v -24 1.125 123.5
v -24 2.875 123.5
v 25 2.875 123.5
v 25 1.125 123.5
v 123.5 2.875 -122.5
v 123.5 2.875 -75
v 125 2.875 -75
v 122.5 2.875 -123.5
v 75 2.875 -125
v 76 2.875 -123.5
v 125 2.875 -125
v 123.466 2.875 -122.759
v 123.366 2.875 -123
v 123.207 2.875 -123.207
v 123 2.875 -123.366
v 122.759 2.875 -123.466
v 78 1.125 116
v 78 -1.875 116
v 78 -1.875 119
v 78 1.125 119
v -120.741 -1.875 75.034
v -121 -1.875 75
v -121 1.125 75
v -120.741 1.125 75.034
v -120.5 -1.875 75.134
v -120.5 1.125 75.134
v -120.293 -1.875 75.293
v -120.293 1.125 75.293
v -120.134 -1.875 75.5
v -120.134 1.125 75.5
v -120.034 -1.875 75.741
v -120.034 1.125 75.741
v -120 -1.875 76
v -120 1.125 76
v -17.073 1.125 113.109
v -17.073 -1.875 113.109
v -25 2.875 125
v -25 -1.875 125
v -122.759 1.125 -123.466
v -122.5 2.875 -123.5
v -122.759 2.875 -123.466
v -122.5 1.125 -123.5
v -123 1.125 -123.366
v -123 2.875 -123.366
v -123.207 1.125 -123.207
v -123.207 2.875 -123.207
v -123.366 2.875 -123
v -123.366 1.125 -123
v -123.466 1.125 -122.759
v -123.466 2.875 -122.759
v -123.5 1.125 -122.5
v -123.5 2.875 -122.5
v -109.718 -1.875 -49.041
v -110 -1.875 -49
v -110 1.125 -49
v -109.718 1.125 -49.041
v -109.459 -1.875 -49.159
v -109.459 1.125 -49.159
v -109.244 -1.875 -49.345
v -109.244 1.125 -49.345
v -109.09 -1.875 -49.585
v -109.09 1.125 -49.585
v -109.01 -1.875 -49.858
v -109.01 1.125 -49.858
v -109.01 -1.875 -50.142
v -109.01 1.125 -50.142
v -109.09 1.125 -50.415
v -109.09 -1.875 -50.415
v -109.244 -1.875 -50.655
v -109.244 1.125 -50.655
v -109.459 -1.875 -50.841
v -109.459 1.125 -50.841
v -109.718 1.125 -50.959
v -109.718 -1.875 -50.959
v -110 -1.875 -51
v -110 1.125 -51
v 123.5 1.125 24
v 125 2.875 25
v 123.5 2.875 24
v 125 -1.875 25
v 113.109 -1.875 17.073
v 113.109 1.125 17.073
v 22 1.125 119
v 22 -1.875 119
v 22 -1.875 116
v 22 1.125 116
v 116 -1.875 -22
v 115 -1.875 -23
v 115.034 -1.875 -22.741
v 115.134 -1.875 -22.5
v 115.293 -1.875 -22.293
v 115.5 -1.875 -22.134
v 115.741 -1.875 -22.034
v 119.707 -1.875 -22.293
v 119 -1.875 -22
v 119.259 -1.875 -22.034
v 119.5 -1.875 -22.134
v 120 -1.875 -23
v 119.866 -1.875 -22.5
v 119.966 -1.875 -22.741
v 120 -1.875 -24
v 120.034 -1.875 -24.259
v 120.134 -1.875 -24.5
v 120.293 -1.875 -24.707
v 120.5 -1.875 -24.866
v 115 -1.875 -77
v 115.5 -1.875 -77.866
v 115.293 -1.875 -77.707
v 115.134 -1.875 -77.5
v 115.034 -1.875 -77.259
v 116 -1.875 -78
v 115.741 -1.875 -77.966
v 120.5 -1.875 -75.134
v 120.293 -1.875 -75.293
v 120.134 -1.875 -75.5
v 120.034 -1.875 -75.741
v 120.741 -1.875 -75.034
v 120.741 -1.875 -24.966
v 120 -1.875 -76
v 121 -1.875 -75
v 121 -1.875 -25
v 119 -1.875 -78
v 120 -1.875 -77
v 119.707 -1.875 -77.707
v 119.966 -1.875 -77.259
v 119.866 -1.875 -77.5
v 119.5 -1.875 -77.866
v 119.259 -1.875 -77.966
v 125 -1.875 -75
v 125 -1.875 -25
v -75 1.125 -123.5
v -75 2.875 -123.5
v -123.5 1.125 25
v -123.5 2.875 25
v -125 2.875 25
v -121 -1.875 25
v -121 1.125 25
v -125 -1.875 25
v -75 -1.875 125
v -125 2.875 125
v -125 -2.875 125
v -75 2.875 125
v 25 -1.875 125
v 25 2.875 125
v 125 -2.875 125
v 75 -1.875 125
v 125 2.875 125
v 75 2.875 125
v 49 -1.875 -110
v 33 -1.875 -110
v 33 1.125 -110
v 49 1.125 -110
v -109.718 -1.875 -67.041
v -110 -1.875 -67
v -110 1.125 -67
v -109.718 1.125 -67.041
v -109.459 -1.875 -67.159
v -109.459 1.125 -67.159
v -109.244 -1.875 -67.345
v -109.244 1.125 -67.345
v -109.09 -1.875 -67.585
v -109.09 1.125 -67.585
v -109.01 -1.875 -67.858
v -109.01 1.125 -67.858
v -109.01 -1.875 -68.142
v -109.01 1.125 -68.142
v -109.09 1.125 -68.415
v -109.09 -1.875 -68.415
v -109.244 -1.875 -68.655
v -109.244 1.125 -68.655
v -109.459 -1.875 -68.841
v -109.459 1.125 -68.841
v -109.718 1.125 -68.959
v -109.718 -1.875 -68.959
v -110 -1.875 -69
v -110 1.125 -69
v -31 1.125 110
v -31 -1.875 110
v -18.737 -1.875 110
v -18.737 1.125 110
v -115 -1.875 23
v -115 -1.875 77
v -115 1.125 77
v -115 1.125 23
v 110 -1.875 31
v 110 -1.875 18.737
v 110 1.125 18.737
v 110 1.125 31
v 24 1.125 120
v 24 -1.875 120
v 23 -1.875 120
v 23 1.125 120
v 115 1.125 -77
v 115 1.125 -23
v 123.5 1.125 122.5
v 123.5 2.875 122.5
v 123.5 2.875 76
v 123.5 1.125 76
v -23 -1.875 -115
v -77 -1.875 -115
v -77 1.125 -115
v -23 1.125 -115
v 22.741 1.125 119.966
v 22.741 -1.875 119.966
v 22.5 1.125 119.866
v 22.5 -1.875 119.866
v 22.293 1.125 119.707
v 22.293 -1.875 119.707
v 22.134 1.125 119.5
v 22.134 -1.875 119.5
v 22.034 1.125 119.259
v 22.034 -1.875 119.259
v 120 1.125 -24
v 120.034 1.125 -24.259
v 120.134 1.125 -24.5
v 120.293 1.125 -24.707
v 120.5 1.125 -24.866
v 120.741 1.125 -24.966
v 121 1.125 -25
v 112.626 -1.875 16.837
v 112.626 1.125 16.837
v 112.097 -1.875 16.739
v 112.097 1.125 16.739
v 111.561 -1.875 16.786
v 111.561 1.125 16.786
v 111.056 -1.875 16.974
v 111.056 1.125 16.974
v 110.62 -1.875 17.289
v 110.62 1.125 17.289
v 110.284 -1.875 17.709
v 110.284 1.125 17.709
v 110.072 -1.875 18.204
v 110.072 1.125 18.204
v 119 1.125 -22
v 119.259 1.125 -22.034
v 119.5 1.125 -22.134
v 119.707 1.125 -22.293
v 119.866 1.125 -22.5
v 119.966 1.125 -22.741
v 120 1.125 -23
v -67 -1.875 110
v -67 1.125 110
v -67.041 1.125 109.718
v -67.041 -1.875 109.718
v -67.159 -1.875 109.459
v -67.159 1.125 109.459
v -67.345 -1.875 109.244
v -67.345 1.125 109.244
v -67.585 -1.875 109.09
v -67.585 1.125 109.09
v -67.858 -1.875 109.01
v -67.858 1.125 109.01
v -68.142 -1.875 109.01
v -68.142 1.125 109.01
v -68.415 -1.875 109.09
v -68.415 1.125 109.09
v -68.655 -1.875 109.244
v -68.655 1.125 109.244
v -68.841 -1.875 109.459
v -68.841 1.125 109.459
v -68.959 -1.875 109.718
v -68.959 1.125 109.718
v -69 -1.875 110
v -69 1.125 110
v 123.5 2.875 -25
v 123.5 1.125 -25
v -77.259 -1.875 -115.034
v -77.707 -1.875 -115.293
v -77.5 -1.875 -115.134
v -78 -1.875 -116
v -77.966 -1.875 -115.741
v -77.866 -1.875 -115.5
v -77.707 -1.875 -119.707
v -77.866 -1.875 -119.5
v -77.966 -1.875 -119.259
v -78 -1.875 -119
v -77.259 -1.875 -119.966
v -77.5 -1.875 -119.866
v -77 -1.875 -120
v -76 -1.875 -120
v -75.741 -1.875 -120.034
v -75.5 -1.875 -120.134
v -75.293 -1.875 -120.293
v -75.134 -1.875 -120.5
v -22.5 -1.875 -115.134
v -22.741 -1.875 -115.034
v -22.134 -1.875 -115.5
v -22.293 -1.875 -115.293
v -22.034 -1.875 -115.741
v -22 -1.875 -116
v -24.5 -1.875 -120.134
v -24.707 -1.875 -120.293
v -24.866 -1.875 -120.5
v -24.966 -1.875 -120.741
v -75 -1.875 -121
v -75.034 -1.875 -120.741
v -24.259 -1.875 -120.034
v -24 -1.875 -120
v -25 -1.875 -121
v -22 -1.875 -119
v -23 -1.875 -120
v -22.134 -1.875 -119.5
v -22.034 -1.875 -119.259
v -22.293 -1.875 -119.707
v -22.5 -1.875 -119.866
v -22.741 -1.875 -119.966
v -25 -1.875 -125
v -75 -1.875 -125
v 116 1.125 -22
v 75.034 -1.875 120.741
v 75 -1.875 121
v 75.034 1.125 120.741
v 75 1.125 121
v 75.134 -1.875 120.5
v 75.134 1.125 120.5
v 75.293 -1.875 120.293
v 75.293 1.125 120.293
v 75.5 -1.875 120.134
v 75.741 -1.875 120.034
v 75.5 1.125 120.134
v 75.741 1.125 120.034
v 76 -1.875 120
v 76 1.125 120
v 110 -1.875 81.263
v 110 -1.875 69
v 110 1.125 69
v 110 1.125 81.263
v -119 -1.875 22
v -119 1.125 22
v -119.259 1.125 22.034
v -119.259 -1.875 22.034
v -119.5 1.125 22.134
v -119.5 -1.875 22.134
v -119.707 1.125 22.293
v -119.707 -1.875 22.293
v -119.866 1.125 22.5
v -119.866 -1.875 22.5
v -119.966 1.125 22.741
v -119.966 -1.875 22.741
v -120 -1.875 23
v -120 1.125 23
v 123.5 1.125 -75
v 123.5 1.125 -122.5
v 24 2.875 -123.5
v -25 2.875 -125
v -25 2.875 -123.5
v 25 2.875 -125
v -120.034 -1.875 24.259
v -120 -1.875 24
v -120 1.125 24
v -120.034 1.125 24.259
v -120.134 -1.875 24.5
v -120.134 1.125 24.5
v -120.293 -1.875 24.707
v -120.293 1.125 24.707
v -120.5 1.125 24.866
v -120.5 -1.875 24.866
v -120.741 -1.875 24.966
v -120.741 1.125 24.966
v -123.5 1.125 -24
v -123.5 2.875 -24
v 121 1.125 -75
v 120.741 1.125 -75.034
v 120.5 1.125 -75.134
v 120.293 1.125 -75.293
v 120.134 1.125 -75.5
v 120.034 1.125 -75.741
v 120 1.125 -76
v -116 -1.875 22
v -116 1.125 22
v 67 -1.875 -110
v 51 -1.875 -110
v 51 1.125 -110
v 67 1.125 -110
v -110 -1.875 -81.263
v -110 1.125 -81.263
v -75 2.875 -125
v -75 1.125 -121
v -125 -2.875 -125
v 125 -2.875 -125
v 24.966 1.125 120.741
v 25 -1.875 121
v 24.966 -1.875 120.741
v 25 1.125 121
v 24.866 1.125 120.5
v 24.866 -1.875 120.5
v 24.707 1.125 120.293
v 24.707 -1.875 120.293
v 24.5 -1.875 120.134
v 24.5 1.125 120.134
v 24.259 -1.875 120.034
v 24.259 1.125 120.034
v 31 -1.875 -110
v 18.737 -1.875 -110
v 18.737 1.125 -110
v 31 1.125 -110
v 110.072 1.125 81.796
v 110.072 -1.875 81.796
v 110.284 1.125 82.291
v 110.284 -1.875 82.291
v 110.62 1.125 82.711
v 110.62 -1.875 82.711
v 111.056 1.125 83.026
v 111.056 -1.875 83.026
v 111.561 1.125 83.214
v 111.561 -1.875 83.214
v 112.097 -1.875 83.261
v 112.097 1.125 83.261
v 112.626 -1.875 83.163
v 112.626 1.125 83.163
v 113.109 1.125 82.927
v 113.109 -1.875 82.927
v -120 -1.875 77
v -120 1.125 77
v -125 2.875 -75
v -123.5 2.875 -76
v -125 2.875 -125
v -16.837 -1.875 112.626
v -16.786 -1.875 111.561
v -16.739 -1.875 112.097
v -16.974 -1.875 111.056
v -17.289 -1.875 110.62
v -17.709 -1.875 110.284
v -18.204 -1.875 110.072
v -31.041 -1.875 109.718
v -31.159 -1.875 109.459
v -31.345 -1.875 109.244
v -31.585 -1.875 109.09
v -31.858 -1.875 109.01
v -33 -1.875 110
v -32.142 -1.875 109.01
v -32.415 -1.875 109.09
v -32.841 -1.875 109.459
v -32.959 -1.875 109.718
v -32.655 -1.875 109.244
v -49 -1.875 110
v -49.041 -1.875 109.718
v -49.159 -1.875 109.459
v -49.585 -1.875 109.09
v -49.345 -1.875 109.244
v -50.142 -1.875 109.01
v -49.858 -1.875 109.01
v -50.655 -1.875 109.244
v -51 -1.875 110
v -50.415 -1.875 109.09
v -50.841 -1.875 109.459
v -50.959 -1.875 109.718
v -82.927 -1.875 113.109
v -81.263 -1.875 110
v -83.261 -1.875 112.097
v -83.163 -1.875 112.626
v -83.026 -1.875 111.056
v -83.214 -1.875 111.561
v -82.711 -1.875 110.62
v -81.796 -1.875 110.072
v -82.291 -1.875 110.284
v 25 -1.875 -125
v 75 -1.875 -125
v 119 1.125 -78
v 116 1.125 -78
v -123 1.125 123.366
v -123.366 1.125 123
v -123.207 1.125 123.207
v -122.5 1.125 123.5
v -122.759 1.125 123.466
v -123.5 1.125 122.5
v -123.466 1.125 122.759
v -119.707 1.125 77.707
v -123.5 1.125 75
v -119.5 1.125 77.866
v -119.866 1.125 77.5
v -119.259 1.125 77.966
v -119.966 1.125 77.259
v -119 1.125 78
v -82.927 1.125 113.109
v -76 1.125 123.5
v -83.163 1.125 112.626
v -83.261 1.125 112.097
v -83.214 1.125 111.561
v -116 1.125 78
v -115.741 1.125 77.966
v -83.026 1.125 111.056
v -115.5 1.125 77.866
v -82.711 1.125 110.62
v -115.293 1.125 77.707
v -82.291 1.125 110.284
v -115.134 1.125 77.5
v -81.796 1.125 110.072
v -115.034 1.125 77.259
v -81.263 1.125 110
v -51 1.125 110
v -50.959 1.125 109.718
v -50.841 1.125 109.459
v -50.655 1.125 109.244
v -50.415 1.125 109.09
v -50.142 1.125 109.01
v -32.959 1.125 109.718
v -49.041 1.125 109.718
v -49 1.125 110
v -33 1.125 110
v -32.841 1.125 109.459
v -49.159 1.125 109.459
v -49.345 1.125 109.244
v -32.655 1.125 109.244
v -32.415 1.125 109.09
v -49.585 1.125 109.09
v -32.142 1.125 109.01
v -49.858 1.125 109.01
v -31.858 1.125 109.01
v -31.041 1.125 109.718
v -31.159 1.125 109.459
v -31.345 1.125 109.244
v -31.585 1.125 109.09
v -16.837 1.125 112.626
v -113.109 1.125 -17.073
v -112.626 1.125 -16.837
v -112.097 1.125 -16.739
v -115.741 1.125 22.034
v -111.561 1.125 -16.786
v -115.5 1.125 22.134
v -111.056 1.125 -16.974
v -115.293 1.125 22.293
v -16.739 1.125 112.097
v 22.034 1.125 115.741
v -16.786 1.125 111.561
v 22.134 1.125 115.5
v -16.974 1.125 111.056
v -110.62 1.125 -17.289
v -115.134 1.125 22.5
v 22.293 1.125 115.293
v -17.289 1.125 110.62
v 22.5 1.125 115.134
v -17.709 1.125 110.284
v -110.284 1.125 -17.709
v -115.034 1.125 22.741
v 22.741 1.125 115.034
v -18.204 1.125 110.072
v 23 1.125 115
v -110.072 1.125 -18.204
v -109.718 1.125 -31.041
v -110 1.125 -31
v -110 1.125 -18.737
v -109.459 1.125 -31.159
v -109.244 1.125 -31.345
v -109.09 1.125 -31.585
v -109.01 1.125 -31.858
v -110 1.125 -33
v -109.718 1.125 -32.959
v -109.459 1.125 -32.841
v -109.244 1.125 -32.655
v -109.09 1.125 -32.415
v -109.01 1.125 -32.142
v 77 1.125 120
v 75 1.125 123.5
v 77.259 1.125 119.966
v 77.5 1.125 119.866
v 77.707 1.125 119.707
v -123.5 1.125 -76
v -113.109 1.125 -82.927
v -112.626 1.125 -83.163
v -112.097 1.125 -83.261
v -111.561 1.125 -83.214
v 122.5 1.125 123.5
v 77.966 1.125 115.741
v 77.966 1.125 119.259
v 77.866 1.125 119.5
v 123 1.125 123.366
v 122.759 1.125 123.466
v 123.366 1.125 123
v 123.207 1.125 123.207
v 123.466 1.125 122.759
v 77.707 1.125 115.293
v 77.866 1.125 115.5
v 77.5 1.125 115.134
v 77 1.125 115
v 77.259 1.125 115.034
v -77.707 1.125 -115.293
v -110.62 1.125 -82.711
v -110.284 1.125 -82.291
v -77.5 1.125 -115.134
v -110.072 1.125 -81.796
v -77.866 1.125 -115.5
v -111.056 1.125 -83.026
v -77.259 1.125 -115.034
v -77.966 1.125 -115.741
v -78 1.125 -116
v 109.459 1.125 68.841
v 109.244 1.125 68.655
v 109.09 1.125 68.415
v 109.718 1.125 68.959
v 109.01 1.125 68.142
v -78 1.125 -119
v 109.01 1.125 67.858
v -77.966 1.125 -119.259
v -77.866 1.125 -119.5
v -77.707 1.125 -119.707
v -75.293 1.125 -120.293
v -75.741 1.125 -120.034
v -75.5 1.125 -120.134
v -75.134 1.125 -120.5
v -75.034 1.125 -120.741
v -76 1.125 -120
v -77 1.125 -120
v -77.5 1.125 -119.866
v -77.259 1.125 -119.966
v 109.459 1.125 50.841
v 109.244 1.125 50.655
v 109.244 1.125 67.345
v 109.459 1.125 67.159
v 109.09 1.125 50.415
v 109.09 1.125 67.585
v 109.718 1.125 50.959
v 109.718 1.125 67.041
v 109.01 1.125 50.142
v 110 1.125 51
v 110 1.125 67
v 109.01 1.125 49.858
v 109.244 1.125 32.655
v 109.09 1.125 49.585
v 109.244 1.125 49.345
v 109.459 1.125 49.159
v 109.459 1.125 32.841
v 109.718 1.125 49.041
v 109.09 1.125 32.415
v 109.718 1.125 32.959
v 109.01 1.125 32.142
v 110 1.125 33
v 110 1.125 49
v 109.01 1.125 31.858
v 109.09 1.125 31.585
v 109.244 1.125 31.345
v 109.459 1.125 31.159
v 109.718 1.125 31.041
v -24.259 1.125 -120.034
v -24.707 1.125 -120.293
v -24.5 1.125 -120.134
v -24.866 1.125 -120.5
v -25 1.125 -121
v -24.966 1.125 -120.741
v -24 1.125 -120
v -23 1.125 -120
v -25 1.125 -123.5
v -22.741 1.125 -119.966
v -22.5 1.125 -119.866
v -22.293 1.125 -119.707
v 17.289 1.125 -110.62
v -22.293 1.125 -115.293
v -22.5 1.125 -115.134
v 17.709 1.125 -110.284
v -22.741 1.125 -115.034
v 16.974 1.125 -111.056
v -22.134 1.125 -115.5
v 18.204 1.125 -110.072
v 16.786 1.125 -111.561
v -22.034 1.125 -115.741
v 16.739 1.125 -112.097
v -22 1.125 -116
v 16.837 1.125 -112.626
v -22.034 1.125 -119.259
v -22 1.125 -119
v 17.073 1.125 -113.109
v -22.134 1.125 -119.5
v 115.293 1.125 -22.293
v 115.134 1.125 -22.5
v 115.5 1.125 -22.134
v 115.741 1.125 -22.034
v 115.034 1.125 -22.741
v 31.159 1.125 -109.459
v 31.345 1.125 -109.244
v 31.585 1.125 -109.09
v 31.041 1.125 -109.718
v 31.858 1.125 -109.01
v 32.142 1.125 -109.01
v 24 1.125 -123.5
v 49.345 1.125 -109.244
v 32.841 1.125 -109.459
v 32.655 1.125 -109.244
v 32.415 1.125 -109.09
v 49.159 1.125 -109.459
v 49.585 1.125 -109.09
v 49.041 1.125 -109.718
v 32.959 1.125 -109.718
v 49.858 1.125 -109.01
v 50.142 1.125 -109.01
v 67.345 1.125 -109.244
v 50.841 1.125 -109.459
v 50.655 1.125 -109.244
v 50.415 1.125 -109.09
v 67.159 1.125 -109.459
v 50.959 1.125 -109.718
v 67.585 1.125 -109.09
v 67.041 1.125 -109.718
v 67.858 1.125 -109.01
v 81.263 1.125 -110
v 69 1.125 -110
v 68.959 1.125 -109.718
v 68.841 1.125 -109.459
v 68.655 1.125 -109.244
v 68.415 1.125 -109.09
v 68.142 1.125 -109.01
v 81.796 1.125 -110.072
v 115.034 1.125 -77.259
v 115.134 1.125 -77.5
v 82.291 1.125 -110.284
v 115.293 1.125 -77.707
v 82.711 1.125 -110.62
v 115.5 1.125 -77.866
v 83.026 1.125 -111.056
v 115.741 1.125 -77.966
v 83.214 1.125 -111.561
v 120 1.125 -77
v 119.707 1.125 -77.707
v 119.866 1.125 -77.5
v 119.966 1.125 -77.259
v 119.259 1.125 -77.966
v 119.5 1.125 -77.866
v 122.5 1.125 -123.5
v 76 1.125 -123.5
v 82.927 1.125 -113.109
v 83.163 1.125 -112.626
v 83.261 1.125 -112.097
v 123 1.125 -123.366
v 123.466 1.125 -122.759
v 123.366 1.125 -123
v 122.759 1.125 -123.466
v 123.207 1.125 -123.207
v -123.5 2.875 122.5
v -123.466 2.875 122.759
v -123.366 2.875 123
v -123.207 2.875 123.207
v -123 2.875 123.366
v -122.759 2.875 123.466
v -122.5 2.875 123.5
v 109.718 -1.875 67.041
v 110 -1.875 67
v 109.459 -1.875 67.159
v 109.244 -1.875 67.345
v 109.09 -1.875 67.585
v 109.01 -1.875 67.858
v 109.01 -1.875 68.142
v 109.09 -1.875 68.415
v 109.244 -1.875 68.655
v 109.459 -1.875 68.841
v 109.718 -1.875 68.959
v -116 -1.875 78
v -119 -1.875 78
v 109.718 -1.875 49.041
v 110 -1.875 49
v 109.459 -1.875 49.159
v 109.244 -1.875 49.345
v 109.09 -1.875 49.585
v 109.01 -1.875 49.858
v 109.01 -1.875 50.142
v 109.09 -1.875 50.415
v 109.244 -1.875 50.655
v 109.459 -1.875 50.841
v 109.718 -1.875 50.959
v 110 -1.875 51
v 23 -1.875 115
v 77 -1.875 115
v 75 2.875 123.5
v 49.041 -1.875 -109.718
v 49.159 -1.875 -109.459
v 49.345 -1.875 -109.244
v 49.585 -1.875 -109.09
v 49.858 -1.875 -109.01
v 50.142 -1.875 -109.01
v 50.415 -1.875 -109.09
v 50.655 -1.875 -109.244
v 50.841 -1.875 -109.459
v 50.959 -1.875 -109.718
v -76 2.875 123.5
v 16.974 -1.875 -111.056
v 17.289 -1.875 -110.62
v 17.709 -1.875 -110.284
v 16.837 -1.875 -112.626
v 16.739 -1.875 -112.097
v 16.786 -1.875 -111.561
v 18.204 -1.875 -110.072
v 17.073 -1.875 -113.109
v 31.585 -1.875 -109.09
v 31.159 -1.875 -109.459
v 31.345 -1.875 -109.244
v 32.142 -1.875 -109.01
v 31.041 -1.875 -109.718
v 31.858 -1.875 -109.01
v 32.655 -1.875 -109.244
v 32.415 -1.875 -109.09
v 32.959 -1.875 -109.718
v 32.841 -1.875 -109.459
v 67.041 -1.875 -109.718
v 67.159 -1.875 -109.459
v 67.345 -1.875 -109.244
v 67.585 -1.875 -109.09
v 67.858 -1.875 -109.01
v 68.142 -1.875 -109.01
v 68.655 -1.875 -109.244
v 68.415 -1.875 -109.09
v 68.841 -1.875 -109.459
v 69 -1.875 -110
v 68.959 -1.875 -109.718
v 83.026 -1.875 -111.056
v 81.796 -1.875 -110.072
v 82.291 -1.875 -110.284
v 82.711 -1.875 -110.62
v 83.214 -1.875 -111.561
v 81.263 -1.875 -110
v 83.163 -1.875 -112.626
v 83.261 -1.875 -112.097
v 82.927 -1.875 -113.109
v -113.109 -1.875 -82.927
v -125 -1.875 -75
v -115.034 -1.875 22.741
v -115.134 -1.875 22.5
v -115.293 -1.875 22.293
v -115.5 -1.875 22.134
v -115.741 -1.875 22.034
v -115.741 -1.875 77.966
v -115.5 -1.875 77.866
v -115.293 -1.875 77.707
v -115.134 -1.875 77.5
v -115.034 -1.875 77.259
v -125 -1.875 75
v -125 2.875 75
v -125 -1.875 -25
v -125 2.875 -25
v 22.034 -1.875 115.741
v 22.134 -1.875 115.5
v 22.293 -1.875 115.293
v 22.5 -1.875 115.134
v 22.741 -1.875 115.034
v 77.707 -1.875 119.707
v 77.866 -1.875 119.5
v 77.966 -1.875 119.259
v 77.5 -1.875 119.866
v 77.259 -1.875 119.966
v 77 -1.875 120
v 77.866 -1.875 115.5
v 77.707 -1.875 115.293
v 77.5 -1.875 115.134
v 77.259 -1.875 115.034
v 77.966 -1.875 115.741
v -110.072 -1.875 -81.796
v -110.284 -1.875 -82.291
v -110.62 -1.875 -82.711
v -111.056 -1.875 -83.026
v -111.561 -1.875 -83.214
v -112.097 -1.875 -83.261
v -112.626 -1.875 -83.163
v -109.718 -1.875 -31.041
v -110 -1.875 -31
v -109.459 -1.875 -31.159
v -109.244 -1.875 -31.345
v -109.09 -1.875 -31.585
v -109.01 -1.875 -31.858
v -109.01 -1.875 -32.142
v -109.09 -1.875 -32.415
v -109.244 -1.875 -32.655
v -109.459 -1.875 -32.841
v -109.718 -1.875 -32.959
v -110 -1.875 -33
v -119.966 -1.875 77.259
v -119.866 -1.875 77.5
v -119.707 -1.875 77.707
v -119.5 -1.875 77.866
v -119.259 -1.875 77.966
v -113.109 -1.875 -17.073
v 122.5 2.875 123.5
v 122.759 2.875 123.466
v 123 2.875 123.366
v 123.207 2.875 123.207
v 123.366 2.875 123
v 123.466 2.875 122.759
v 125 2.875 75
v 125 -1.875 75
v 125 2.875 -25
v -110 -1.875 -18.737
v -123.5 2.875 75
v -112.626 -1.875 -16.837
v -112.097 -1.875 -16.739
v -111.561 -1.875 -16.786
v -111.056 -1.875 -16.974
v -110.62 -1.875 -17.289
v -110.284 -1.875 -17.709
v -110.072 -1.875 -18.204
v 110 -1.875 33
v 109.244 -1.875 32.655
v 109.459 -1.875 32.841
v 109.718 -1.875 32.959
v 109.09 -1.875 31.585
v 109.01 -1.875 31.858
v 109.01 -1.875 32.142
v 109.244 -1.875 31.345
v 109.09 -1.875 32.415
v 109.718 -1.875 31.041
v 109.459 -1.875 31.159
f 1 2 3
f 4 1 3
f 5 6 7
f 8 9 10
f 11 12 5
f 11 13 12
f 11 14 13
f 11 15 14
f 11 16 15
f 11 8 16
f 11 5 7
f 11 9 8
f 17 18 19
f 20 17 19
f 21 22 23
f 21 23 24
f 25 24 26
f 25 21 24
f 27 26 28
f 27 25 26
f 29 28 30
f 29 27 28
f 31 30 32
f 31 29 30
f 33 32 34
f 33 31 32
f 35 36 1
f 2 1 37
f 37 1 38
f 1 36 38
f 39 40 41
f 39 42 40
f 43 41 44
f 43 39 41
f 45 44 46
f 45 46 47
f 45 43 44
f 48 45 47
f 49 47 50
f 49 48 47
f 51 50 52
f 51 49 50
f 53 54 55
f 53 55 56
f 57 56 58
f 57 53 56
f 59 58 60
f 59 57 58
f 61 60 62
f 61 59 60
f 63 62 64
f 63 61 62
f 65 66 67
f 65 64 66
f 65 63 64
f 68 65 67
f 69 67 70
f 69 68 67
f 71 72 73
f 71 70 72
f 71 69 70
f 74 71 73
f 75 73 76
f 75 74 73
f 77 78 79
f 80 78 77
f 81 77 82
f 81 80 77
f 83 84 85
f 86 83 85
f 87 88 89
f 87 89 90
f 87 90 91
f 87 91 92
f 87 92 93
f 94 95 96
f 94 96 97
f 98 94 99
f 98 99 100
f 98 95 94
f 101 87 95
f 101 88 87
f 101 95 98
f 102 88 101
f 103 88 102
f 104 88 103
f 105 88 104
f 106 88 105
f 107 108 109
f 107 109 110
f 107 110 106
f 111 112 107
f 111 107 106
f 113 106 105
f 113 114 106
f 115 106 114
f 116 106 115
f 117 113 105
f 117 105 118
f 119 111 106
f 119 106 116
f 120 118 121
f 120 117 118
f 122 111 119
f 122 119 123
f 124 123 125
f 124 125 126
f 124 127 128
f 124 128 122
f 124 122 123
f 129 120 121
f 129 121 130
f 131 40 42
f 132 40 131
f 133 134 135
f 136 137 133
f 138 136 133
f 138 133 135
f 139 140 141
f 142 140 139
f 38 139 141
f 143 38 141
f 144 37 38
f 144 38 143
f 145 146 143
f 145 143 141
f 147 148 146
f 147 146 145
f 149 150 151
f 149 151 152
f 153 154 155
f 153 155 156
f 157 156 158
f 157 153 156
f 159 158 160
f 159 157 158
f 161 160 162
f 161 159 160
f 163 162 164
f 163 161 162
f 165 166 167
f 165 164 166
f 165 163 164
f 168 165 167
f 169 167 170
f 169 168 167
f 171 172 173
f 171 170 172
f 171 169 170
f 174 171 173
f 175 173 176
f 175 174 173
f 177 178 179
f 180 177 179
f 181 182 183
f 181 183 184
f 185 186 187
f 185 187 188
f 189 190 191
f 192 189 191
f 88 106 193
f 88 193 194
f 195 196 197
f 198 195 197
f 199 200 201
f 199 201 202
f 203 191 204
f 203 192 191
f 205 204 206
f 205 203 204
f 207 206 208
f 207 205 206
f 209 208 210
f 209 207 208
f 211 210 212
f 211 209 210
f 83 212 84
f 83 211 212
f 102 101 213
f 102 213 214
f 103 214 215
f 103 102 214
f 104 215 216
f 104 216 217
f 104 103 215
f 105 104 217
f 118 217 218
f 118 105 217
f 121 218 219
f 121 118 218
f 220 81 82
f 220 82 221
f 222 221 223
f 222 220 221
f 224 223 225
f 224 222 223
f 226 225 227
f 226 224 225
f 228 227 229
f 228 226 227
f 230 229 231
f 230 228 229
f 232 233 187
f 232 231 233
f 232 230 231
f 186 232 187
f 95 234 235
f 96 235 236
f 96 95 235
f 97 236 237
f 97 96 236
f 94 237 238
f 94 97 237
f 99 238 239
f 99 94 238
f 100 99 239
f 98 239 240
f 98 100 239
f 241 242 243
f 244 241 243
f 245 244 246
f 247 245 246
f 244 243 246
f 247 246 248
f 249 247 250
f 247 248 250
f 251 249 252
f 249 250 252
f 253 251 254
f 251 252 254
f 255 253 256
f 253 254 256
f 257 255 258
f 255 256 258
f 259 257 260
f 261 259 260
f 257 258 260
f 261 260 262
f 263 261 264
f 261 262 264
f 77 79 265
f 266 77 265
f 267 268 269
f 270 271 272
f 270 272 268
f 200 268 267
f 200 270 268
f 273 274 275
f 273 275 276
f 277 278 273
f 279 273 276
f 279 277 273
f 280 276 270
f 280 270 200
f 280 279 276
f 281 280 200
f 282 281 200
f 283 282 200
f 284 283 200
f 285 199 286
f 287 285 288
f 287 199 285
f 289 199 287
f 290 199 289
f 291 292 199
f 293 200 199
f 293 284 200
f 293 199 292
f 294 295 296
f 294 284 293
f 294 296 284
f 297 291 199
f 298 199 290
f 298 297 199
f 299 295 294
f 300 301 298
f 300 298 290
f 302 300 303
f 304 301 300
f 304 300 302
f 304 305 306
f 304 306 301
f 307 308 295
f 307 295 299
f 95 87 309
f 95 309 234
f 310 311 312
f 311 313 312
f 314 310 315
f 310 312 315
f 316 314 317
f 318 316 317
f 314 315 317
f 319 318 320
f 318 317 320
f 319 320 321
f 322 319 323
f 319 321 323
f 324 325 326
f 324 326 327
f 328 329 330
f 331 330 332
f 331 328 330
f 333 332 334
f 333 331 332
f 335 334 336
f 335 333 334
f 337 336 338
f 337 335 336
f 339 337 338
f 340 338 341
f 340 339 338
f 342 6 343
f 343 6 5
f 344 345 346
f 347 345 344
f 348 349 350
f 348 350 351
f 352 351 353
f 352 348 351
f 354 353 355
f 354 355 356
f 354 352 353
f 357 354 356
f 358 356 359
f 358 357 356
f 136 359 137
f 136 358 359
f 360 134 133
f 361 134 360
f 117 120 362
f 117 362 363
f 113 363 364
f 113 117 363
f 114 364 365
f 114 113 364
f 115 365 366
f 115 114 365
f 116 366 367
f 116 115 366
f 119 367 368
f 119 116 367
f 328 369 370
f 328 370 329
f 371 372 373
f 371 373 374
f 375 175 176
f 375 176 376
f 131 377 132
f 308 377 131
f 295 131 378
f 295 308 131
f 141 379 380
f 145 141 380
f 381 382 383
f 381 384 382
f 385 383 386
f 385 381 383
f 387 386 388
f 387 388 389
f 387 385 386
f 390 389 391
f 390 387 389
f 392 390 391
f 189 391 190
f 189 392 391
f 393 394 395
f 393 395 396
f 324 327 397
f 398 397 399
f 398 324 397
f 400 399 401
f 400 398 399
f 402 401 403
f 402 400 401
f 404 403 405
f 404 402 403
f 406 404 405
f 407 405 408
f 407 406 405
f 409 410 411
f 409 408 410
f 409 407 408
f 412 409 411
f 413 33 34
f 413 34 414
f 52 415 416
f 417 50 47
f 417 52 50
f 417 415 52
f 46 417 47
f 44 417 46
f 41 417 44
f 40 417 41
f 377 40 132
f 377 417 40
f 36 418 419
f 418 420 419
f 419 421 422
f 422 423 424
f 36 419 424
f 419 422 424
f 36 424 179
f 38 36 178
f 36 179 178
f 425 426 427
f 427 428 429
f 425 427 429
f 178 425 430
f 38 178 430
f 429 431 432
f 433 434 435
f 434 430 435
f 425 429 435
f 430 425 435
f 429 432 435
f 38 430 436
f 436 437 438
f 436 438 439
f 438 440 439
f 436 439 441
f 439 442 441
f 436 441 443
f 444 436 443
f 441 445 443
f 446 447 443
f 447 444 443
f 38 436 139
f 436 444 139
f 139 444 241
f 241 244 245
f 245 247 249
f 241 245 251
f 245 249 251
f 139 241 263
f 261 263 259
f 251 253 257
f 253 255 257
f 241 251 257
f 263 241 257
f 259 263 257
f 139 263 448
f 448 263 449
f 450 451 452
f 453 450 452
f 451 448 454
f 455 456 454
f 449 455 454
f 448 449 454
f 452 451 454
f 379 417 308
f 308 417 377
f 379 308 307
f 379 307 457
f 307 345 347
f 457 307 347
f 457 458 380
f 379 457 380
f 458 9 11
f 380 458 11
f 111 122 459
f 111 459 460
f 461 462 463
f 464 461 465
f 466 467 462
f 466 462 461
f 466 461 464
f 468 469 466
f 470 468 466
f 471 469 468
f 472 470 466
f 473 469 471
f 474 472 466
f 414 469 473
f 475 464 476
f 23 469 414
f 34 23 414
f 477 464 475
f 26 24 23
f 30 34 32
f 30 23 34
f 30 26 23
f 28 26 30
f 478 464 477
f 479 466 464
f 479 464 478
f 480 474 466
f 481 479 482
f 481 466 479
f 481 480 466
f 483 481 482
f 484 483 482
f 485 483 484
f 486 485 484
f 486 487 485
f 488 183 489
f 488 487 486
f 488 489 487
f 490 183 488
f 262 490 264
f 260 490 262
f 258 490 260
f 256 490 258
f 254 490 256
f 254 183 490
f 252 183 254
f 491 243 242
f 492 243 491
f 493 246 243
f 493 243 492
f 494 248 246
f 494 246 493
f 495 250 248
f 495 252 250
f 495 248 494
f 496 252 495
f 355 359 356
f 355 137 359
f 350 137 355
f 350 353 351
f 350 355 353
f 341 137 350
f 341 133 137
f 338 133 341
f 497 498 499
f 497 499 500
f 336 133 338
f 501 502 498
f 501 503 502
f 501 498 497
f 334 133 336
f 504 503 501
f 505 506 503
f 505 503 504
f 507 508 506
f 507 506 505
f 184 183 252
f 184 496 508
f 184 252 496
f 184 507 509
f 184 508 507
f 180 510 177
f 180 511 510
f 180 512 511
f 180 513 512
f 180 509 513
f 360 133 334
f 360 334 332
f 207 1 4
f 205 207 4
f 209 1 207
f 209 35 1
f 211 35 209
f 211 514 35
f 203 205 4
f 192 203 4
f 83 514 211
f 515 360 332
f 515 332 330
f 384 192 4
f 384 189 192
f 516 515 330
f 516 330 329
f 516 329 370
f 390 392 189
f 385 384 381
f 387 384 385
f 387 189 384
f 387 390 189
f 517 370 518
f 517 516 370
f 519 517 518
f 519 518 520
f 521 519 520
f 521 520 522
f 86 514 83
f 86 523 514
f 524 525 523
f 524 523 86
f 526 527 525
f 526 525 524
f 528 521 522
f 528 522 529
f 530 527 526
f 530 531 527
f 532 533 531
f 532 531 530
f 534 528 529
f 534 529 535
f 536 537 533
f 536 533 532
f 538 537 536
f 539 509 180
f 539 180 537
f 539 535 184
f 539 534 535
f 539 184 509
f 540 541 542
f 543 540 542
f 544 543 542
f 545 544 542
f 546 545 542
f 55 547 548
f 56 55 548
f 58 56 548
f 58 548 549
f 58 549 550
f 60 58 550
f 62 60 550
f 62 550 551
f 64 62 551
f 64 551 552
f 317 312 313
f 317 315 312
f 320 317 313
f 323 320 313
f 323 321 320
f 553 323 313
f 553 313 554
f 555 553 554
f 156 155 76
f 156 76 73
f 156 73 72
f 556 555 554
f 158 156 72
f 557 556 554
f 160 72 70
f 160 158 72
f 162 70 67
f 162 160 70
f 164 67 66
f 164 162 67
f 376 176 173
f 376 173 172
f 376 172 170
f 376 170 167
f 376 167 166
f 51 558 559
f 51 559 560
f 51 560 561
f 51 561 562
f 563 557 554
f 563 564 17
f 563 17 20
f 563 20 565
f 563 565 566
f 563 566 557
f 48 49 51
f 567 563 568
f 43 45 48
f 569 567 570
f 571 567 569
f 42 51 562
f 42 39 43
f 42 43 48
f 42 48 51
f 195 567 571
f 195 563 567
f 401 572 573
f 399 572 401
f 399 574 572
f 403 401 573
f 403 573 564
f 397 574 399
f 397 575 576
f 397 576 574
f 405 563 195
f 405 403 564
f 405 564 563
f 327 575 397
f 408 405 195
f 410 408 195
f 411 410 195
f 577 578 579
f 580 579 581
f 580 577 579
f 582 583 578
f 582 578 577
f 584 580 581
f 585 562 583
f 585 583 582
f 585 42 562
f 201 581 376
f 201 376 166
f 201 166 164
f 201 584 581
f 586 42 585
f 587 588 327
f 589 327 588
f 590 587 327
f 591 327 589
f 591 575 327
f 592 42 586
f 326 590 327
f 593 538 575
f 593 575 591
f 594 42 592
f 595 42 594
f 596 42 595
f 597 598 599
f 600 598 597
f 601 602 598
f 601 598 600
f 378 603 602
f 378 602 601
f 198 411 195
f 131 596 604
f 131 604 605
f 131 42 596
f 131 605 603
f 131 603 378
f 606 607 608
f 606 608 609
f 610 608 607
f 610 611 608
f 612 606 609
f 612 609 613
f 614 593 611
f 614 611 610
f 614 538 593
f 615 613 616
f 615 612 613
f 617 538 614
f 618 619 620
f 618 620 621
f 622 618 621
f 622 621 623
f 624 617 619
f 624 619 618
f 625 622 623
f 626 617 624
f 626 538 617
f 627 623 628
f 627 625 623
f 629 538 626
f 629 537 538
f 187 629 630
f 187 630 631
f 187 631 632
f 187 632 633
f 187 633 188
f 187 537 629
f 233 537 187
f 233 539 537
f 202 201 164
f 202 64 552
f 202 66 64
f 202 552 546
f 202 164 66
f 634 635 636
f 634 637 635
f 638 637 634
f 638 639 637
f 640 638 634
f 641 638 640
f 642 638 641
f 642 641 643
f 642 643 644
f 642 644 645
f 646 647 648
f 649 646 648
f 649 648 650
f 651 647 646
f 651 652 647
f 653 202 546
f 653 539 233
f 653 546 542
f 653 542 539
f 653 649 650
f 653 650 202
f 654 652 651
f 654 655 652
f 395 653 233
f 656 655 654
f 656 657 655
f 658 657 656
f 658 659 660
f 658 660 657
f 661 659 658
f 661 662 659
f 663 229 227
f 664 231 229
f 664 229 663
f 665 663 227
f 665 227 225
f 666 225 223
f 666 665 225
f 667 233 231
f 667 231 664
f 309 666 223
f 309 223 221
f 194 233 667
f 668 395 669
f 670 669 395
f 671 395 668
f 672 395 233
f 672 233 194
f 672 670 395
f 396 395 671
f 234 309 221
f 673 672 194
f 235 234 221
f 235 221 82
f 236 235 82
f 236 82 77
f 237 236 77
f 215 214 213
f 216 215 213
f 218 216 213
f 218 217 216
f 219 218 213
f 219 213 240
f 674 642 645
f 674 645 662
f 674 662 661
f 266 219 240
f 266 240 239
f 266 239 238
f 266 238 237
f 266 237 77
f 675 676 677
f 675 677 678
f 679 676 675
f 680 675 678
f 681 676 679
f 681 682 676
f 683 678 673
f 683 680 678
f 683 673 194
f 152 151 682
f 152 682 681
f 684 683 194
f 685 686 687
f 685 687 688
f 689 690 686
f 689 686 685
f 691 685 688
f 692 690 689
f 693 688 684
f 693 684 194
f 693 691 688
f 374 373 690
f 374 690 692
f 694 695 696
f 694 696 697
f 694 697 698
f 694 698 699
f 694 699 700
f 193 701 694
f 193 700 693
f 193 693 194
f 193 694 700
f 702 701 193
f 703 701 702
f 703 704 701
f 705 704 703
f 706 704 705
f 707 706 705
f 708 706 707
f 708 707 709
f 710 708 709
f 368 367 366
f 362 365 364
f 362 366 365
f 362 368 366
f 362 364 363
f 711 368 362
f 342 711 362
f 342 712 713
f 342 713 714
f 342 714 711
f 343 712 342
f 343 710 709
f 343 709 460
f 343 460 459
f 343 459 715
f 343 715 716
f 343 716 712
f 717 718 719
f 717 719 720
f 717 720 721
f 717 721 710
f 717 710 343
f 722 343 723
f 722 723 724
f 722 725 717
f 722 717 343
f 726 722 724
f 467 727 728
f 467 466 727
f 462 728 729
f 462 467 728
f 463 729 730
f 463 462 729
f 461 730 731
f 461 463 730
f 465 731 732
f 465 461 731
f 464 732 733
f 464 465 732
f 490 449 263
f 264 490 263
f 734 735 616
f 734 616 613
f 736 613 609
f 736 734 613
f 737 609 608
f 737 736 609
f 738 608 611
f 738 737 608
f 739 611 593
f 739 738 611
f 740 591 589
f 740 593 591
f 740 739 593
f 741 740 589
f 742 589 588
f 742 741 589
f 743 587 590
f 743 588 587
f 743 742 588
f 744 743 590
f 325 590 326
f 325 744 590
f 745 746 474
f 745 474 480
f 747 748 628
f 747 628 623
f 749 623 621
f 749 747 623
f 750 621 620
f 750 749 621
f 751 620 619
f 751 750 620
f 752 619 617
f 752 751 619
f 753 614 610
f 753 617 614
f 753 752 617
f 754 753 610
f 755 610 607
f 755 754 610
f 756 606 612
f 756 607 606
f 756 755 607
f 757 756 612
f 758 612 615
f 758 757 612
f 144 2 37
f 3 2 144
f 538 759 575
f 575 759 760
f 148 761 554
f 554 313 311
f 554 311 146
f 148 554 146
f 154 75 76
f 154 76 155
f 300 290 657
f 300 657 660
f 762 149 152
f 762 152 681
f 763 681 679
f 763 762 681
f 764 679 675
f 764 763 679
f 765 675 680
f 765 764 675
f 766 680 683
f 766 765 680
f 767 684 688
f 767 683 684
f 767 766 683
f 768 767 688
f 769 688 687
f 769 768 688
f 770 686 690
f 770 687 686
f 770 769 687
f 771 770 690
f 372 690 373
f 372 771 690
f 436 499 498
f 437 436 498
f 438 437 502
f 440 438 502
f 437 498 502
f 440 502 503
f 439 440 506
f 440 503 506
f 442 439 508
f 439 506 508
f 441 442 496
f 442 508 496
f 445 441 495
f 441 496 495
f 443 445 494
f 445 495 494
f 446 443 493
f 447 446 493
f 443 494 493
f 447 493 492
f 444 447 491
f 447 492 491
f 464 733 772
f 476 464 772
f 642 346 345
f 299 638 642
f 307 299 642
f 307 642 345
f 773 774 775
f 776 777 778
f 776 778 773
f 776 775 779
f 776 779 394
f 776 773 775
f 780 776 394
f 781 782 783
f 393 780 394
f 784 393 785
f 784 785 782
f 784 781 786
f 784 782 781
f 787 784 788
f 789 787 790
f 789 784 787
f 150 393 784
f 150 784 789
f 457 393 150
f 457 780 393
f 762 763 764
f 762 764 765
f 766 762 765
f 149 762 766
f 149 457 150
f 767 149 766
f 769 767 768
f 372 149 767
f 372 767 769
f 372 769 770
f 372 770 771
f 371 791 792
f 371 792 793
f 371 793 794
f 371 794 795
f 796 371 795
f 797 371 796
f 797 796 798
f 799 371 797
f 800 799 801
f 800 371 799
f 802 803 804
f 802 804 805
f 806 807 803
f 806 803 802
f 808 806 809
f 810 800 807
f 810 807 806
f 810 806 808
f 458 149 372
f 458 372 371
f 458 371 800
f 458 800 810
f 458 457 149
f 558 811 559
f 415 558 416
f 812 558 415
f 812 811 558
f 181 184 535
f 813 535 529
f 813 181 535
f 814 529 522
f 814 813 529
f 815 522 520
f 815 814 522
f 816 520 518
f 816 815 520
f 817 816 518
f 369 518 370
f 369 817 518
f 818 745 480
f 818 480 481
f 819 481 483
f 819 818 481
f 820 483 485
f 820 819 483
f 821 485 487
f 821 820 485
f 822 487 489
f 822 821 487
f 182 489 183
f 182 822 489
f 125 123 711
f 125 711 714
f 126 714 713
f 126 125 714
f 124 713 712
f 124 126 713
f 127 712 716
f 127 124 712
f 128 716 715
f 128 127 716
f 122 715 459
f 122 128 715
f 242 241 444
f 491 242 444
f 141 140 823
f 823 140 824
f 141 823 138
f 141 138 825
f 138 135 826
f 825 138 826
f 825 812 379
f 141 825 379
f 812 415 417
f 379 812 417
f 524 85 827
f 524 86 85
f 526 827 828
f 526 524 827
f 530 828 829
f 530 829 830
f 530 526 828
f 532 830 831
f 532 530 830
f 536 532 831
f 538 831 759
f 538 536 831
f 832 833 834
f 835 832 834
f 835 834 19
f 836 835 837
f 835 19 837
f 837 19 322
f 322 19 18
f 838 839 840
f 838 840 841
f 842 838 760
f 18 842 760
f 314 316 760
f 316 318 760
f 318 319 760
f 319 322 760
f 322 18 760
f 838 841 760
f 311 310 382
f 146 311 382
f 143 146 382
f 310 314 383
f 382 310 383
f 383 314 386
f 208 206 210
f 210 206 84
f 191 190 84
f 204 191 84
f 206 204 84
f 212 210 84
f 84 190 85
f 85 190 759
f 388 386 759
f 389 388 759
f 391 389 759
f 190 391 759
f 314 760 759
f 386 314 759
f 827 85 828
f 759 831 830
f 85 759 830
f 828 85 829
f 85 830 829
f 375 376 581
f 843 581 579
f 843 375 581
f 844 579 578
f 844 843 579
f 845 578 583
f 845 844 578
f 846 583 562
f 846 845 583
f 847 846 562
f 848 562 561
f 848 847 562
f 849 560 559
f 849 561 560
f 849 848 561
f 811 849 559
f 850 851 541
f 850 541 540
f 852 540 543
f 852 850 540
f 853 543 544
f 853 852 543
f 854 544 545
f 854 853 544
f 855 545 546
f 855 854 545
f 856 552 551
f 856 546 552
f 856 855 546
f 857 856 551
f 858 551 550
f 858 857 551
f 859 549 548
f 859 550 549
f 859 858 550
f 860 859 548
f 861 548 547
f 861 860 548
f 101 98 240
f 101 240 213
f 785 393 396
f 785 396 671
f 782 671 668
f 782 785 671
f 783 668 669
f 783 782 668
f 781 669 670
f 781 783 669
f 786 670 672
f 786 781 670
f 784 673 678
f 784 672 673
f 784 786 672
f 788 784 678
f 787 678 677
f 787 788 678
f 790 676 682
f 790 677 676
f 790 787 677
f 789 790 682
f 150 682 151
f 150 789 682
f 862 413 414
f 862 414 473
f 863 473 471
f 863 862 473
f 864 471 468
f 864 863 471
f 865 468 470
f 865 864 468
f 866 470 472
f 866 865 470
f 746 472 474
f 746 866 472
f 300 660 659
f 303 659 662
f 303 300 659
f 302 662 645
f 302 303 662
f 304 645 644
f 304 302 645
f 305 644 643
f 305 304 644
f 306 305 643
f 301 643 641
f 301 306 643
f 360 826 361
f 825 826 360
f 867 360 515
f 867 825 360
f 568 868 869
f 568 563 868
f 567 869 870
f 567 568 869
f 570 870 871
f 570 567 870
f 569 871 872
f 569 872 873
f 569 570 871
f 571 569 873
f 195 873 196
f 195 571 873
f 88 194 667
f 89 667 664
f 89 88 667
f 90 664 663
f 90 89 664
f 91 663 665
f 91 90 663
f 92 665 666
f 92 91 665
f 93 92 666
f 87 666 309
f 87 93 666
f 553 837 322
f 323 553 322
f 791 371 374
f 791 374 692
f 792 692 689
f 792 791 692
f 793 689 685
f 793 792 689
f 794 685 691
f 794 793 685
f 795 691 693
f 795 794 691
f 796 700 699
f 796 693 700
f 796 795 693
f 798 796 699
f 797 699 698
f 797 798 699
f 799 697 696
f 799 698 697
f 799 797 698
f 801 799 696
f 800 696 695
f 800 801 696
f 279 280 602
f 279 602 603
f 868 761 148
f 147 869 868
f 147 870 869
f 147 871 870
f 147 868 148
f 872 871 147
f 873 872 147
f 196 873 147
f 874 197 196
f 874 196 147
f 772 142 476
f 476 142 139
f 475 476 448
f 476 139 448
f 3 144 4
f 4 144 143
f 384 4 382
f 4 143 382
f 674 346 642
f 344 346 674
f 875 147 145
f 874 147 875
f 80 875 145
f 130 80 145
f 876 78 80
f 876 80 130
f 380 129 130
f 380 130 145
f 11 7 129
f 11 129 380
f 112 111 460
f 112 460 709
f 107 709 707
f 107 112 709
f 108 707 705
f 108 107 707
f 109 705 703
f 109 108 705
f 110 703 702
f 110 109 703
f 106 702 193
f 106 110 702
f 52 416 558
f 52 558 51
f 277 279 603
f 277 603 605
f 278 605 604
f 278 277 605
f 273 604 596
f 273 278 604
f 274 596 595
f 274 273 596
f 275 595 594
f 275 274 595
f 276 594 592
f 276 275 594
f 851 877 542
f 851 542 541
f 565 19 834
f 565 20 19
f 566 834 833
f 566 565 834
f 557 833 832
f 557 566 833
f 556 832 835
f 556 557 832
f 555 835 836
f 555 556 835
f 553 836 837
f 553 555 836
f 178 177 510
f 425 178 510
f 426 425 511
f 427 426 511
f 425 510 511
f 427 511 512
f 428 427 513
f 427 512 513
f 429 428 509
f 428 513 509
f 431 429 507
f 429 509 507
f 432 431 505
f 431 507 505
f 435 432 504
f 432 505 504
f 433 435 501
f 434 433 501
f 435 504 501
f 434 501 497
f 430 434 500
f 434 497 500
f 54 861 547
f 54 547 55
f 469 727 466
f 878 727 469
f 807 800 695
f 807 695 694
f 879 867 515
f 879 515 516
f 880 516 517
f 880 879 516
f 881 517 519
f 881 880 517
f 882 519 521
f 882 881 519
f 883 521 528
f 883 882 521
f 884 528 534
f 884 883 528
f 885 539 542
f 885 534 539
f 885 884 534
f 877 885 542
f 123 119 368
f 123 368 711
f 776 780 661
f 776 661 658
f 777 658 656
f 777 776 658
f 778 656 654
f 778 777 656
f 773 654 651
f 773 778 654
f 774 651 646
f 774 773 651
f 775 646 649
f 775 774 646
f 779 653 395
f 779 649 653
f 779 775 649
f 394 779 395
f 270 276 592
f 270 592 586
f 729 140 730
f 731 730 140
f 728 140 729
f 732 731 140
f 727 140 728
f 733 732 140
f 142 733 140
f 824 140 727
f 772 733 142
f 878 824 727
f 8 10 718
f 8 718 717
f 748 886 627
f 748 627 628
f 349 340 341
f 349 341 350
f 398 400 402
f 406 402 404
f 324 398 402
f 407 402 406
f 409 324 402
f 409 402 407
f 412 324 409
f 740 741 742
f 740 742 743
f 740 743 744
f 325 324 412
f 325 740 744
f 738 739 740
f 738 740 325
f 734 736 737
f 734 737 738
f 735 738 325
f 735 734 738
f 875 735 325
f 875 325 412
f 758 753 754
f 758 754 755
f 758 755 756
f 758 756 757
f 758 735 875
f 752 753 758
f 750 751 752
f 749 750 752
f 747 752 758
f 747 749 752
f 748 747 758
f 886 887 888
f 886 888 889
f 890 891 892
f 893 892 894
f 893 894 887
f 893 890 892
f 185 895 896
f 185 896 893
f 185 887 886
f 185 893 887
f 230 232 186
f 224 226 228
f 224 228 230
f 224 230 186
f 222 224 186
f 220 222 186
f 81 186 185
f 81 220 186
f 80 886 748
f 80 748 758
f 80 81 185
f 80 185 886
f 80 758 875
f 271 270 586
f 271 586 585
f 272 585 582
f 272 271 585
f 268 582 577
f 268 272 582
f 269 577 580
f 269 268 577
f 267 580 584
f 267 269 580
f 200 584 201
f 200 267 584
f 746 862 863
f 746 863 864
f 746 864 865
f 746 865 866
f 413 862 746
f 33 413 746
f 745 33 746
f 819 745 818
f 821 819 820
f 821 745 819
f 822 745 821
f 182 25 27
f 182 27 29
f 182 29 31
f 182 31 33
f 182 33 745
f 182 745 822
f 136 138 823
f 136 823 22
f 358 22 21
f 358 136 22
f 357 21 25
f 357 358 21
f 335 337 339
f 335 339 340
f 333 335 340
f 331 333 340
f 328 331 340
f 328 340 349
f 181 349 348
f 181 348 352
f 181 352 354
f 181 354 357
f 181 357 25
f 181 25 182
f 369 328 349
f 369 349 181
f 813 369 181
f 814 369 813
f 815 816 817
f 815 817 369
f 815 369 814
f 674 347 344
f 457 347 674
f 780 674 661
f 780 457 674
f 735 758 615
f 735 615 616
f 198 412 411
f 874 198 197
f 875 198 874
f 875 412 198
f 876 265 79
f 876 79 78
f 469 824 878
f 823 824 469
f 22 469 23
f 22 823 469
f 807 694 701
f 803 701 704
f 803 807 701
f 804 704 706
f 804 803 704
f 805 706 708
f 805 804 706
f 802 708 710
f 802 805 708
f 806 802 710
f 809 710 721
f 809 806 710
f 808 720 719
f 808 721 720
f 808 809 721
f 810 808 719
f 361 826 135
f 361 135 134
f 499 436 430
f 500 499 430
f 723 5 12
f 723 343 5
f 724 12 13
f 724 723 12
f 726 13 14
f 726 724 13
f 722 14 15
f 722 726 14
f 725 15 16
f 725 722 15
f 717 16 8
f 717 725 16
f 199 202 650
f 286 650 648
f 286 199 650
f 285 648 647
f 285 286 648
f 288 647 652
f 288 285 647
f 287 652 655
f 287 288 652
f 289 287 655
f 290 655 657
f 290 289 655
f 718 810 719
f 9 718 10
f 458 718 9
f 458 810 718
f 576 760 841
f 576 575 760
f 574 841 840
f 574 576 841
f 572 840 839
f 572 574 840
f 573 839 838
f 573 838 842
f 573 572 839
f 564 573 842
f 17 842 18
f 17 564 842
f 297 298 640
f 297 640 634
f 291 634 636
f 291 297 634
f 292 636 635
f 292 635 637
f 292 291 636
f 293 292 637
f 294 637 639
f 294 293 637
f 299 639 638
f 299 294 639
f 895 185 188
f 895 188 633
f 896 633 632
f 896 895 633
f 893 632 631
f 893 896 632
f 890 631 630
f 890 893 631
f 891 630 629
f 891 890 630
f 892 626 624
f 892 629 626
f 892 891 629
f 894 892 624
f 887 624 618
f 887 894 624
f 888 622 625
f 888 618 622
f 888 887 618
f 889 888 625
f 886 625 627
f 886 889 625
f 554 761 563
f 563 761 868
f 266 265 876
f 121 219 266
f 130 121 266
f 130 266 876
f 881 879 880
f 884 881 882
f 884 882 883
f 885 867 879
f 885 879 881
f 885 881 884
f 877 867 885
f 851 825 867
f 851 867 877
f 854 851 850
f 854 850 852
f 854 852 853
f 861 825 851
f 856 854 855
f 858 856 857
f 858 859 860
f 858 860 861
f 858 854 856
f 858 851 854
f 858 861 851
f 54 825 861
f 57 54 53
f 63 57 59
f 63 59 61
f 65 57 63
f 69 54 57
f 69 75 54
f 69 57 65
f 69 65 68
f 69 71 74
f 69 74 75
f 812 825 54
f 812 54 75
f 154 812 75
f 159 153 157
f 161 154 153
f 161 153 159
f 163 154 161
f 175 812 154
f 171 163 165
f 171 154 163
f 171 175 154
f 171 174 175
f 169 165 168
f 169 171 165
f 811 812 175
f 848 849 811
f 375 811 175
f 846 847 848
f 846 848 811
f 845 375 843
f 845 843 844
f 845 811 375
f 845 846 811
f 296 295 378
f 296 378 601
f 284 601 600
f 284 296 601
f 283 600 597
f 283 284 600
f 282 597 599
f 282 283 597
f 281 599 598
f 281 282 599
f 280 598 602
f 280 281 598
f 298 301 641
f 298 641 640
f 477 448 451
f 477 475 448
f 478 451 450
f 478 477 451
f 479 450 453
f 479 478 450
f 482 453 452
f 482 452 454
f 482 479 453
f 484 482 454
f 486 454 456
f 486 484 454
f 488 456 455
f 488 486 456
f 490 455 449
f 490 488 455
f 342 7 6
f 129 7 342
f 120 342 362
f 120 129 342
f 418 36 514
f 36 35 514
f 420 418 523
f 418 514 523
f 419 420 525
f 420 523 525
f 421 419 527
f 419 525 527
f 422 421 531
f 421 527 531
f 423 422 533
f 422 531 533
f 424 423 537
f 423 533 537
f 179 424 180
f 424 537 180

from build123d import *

# Parameters (mm, degrees)
SKETCH1_W           = 250
SKETCH1_H           = 250
BOSS_EXTRUDE1_DEPTH = 2.875
SKETCH2_W           = 247
SKETCH2_H           = 247
CUT_EXTRUDE1_DEPTH  = 1.75
CUT_EXTRUDE2_START  = -4.75
CUT_EXTRUDE2_DEPTH  = 182.620185447
CUT_EXTRUDE4_DEPTH  = 3
CUT_EXTRUDE3_START  = -4.75
CUT_EXTRUDE3_DEPTH  = 182.620185447
FILLET2_R           = 1
FILLET3_R           = 2
CIRPATTERN1_START   = -1.875
CIRPATTERN1_DEPTH   = 4.75


# Read off the part's stored shape, not the designer's step: CirPattern1
with BuildPart() as part:
    # Sketch1 → Boss-Extrude1 (new, symmetric)
    with BuildSketch(Plane(origin=(0, 0, 0), x_dir=(1, 0, 0), z_dir=(0, 1, 0))):
        Rectangle(SKETCH1_W, SKETCH1_H)
    extrude(amount=BOSS_EXTRUDE1_DEPTH, both=True)

    # Sketch2 → Cut-Extrude1 (cut)
    with BuildSketch(Plane(origin=(0, 2.875, 0), x_dir=(1, 0, 0), z_dir=(0, 1, 0))):
        Rectangle(SKETCH2_W, SKETCH2_H)
    extrude(amount=-CUT_EXTRUDE1_DEPTH, mode=Mode.SUBTRACT)

    # Sketch4 → Cut-Extrude2 (cut)
    with BuildSketch(Plane(origin=(0, 2.875, 0), x_dir=(1, 0, 0), z_dir=(0, 1, 0)).offset(CUT_EXTRUDE2_START)):
        Polygon((-75, -125), (-85, -110), (-15, -110), (-25, -125), align=None)
    extrude(amount=CUT_EXTRUDE2_DEPTH, mode=Mode.SUBTRACT)

    # Sketch6 → Cut-Extrude4 (cut)
    with BuildSketch(Plane(origin=(0, 1.125, 0), x_dir=(1, 0, 0), z_dir=(0, 1, 0))):
        with BuildLine():
            Line((-69, -110), (-67, -110))
            ThreePointArc((-67, -110), (-68, -109), (-69, -110))
        make_face()
        with BuildLine():
            Line((-51, -110), (-49, -110))
            ThreePointArc((-49, -110), (-50, -109), (-51, -110))
        make_face()
        with BuildLine():
            Line((-33, -110), (-31, -110))
            ThreePointArc((-31, -110), (-32, -109), (-33, -110))
        make_face()
    extrude(amount=-CUT_EXTRUDE4_DEPTH, mode=Mode.SUBTRACT)

    # Sketch5 → Cut-Extrude3 (cut)
    with BuildSketch(Plane(origin=(0, 2.875, 0), x_dir=(1, 0, 0), z_dir=(0, 1, 0)).offset(CUT_EXTRUDE3_START)):
        Polygon((25, -125), (25, -120), (22, -120), (22, -115), (78, -115), (78, -120), (75, -120), (75, -125), align=None)
    extrude(amount=CUT_EXTRUDE3_DEPTH, mode=Mode.SUBTRACT)

    # Fillet2
    fillet2_edges = [part.edges().sort_by_distance(p)[0] for p in [
        (-123.5, 2, -123.5),
        (-123.5, 2, 123.5),
        (123.5, 2, 123.5),
        (123.5, 2, -123.5),
        (75, -0.375, 120),
        (78, -0.375, 120),
        (78, -0.375, 115),
        (22, -0.375, 115),
        (22, -0.375, 120),
        (25, -0.375, 120),
    ]]
    fillet(fillet2_edges, radius=FILLET2_R)

    # Fillet3
    fillet3_edges = [part.edges().sort_by_distance(p)[0] for p in [
        (-85, -0.375, 110),
        (-15, -0.375, 110),
    ]]
    fillet(fillet3_edges, radius=FILLET3_R)

    # CirPattern1 outline → CirPattern1 (cut)
    with BuildSketch(Plane(origin=(0, 0, 0), x_dir=(1, 0, 0), z_dir=(0, 1, 0)).offset(CIRPATTERN1_START)):
        with BuildLine():
            ThreePointArc((110, -31), (109, -32), (110, -33))
            Line((110, -33), (110, -49))
            ThreePointArc((110, -49), (109, -50), (110, -51))
            Line((110, -51), (110, -67))
            ThreePointArc((110, -67), (109, -68), (110, -69))
            Line((110, -69), (110, -81.262965816))
            ThreePointArc((110, -81.262965816), (111.056284149, -83.026315014), (113.109400392, -82.927066405))
            Line((113.109400392, -82.927066405), (125, -75))
            Line((125, -75), (125, -25))
            Line((125, -25), (113.109400392, -17.072933595))
            ThreePointArc((113.109400392, -17.072933595), (111.056284149, -16.973684986), (110, -18.737034184))
            Line((110, -18.737034184), (110, -31))
        make_face()
        with BuildLine():
            Line((-125, 75), (-125, 25))
            Line((-125, 25), (-113.109400392, 17.072933595))
            ThreePointArc((-113.109400392, 17.072933595), (-111.056284149, 16.973684986), (-110, 18.737034184))
            Line((-110, 18.737034184), (-110, 31))
            ThreePointArc((-110, 31), (-109, 32), (-110, 33))
            Line((-110, 33), (-110, 49))
            ThreePointArc((-110, 49), (-109, 50), (-110, 51))
            Line((-110, 51), (-110, 67))
            ThreePointArc((-110, 67), (-109, 68), (-110, 69))
            Line((-110, 69), (-110, 81.262965816))
            ThreePointArc((-110, 81.262965816), (-111.056284149, 83.026315014), (-113.109400392, 82.927066405))
            Line((-113.109400392, 82.927066405), (-125, 75))
        make_face()
        with BuildLine():
            Line((75, 125), (25, 125))
            Line((25, 125), (17.072933595, 113.109400392))
            ThreePointArc((17.072933595, 113.109400392), (16.973684986, 111.056284149), (18.737034184, 110))
            Line((18.737034184, 110), (31, 110))
            ThreePointArc((31, 110), (32, 109), (33, 110))
            Line((33, 110), (49, 110))
            ThreePointArc((49, 110), (50, 109), (51, 110))
            Line((51, 110), (67, 110))
            ThreePointArc((67, 110), (68, 109), (69, 110))
            Line((69, 110), (81.262965816, 110))
            ThreePointArc((81.262965816, 110), (83.026315014, 111.056284149), (82.927066405, 113.109400392))
            Line((82.927066405, 113.109400392), (75, 125))
        make_face()
        with BuildLine():
            Line((125, 75), (121, 75))
            ThreePointArc((121, 75), (120.292893219, 75.292893219), (120, 76))
            Line((120, 76), (120, 77))
            ThreePointArc((120, 77), (119.707106781, 77.707106781), (119, 78))
            Line((119, 78), (116, 78))
            ThreePointArc((116, 78), (115.292893219, 77.707106781), (115, 77))
            Line((115, 77), (115, 23))
            ThreePointArc((115, 23), (115.292893219, 22.292893219), (116, 22))
            Line((116, 22), (119, 22))
            ThreePointArc((119, 22), (119.707106781, 22.292893219), (120, 23))
            Line((120, 23), (120, 24))
            ThreePointArc((120, 24), (120.292893219, 24.707106781), (121, 25))
            Line((121, 25), (125, 25))
            Line((125, 25), (125, 75))
        make_face()
        with BuildLine():
            Line((-25, 125), (-75, 125))
            Line((-75, 125), (-75, 121))
            ThreePointArc((-75, 121), (-75.292893219, 120.292893219), (-76, 120))
            Line((-76, 120), (-77, 120))
            ThreePointArc((-77, 120), (-77.707106781, 119.707106781), (-78, 119))
            Line((-78, 119), (-78, 116))
            ThreePointArc((-78, 116), (-77.707106781, 115.292893219), (-77, 115))
            Line((-77, 115), (-23, 115))
            ThreePointArc((-23, 115), (-22.292893219, 115.292893219), (-22, 116))
            Line((-22, 116), (-22, 119))
            ThreePointArc((-22, 119), (-22.292893219, 119.707106781), (-23, 120))
            Line((-23, 120), (-24, 120))
            ThreePointArc((-24, 120), (-24.707106781, 120.292893219), (-25, 121))
            Line((-25, 121), (-25, 125))
        make_face()
        with BuildLine():
            Line((-125, -25), (-125, -75))
            Line((-125, -75), (-121, -75))
            ThreePointArc((-121, -75), (-120.292893219, -75.292893219), (-120, -76))
            Line((-120, -76), (-120, -77))
            ThreePointArc((-120, -77), (-119.707106781, -77.707106781), (-119, -78))
            Line((-119, -78), (-116, -78))
            ThreePointArc((-116, -78), (-115.292893219, -77.707106781), (-115, -77))
            Line((-115, -77), (-115, -23))
            ThreePointArc((-115, -23), (-115.292893219, -22.292893219), (-116, -22))
            Line((-116, -22), (-119, -22))
            ThreePointArc((-119, -22), (-119.707106781, -22.292893219), (-120, -23))
            Line((-120, -23), (-120, -24))
            ThreePointArc((-120, -24), (-120.292893219, -24.707106781), (-121, -25))
            Line((-121, -25), (-125, -25))
        make_face()
    extrude(amount=CIRPATTERN1_DEPTH, mode=Mode.SUBTRACT)


solid = part.part
